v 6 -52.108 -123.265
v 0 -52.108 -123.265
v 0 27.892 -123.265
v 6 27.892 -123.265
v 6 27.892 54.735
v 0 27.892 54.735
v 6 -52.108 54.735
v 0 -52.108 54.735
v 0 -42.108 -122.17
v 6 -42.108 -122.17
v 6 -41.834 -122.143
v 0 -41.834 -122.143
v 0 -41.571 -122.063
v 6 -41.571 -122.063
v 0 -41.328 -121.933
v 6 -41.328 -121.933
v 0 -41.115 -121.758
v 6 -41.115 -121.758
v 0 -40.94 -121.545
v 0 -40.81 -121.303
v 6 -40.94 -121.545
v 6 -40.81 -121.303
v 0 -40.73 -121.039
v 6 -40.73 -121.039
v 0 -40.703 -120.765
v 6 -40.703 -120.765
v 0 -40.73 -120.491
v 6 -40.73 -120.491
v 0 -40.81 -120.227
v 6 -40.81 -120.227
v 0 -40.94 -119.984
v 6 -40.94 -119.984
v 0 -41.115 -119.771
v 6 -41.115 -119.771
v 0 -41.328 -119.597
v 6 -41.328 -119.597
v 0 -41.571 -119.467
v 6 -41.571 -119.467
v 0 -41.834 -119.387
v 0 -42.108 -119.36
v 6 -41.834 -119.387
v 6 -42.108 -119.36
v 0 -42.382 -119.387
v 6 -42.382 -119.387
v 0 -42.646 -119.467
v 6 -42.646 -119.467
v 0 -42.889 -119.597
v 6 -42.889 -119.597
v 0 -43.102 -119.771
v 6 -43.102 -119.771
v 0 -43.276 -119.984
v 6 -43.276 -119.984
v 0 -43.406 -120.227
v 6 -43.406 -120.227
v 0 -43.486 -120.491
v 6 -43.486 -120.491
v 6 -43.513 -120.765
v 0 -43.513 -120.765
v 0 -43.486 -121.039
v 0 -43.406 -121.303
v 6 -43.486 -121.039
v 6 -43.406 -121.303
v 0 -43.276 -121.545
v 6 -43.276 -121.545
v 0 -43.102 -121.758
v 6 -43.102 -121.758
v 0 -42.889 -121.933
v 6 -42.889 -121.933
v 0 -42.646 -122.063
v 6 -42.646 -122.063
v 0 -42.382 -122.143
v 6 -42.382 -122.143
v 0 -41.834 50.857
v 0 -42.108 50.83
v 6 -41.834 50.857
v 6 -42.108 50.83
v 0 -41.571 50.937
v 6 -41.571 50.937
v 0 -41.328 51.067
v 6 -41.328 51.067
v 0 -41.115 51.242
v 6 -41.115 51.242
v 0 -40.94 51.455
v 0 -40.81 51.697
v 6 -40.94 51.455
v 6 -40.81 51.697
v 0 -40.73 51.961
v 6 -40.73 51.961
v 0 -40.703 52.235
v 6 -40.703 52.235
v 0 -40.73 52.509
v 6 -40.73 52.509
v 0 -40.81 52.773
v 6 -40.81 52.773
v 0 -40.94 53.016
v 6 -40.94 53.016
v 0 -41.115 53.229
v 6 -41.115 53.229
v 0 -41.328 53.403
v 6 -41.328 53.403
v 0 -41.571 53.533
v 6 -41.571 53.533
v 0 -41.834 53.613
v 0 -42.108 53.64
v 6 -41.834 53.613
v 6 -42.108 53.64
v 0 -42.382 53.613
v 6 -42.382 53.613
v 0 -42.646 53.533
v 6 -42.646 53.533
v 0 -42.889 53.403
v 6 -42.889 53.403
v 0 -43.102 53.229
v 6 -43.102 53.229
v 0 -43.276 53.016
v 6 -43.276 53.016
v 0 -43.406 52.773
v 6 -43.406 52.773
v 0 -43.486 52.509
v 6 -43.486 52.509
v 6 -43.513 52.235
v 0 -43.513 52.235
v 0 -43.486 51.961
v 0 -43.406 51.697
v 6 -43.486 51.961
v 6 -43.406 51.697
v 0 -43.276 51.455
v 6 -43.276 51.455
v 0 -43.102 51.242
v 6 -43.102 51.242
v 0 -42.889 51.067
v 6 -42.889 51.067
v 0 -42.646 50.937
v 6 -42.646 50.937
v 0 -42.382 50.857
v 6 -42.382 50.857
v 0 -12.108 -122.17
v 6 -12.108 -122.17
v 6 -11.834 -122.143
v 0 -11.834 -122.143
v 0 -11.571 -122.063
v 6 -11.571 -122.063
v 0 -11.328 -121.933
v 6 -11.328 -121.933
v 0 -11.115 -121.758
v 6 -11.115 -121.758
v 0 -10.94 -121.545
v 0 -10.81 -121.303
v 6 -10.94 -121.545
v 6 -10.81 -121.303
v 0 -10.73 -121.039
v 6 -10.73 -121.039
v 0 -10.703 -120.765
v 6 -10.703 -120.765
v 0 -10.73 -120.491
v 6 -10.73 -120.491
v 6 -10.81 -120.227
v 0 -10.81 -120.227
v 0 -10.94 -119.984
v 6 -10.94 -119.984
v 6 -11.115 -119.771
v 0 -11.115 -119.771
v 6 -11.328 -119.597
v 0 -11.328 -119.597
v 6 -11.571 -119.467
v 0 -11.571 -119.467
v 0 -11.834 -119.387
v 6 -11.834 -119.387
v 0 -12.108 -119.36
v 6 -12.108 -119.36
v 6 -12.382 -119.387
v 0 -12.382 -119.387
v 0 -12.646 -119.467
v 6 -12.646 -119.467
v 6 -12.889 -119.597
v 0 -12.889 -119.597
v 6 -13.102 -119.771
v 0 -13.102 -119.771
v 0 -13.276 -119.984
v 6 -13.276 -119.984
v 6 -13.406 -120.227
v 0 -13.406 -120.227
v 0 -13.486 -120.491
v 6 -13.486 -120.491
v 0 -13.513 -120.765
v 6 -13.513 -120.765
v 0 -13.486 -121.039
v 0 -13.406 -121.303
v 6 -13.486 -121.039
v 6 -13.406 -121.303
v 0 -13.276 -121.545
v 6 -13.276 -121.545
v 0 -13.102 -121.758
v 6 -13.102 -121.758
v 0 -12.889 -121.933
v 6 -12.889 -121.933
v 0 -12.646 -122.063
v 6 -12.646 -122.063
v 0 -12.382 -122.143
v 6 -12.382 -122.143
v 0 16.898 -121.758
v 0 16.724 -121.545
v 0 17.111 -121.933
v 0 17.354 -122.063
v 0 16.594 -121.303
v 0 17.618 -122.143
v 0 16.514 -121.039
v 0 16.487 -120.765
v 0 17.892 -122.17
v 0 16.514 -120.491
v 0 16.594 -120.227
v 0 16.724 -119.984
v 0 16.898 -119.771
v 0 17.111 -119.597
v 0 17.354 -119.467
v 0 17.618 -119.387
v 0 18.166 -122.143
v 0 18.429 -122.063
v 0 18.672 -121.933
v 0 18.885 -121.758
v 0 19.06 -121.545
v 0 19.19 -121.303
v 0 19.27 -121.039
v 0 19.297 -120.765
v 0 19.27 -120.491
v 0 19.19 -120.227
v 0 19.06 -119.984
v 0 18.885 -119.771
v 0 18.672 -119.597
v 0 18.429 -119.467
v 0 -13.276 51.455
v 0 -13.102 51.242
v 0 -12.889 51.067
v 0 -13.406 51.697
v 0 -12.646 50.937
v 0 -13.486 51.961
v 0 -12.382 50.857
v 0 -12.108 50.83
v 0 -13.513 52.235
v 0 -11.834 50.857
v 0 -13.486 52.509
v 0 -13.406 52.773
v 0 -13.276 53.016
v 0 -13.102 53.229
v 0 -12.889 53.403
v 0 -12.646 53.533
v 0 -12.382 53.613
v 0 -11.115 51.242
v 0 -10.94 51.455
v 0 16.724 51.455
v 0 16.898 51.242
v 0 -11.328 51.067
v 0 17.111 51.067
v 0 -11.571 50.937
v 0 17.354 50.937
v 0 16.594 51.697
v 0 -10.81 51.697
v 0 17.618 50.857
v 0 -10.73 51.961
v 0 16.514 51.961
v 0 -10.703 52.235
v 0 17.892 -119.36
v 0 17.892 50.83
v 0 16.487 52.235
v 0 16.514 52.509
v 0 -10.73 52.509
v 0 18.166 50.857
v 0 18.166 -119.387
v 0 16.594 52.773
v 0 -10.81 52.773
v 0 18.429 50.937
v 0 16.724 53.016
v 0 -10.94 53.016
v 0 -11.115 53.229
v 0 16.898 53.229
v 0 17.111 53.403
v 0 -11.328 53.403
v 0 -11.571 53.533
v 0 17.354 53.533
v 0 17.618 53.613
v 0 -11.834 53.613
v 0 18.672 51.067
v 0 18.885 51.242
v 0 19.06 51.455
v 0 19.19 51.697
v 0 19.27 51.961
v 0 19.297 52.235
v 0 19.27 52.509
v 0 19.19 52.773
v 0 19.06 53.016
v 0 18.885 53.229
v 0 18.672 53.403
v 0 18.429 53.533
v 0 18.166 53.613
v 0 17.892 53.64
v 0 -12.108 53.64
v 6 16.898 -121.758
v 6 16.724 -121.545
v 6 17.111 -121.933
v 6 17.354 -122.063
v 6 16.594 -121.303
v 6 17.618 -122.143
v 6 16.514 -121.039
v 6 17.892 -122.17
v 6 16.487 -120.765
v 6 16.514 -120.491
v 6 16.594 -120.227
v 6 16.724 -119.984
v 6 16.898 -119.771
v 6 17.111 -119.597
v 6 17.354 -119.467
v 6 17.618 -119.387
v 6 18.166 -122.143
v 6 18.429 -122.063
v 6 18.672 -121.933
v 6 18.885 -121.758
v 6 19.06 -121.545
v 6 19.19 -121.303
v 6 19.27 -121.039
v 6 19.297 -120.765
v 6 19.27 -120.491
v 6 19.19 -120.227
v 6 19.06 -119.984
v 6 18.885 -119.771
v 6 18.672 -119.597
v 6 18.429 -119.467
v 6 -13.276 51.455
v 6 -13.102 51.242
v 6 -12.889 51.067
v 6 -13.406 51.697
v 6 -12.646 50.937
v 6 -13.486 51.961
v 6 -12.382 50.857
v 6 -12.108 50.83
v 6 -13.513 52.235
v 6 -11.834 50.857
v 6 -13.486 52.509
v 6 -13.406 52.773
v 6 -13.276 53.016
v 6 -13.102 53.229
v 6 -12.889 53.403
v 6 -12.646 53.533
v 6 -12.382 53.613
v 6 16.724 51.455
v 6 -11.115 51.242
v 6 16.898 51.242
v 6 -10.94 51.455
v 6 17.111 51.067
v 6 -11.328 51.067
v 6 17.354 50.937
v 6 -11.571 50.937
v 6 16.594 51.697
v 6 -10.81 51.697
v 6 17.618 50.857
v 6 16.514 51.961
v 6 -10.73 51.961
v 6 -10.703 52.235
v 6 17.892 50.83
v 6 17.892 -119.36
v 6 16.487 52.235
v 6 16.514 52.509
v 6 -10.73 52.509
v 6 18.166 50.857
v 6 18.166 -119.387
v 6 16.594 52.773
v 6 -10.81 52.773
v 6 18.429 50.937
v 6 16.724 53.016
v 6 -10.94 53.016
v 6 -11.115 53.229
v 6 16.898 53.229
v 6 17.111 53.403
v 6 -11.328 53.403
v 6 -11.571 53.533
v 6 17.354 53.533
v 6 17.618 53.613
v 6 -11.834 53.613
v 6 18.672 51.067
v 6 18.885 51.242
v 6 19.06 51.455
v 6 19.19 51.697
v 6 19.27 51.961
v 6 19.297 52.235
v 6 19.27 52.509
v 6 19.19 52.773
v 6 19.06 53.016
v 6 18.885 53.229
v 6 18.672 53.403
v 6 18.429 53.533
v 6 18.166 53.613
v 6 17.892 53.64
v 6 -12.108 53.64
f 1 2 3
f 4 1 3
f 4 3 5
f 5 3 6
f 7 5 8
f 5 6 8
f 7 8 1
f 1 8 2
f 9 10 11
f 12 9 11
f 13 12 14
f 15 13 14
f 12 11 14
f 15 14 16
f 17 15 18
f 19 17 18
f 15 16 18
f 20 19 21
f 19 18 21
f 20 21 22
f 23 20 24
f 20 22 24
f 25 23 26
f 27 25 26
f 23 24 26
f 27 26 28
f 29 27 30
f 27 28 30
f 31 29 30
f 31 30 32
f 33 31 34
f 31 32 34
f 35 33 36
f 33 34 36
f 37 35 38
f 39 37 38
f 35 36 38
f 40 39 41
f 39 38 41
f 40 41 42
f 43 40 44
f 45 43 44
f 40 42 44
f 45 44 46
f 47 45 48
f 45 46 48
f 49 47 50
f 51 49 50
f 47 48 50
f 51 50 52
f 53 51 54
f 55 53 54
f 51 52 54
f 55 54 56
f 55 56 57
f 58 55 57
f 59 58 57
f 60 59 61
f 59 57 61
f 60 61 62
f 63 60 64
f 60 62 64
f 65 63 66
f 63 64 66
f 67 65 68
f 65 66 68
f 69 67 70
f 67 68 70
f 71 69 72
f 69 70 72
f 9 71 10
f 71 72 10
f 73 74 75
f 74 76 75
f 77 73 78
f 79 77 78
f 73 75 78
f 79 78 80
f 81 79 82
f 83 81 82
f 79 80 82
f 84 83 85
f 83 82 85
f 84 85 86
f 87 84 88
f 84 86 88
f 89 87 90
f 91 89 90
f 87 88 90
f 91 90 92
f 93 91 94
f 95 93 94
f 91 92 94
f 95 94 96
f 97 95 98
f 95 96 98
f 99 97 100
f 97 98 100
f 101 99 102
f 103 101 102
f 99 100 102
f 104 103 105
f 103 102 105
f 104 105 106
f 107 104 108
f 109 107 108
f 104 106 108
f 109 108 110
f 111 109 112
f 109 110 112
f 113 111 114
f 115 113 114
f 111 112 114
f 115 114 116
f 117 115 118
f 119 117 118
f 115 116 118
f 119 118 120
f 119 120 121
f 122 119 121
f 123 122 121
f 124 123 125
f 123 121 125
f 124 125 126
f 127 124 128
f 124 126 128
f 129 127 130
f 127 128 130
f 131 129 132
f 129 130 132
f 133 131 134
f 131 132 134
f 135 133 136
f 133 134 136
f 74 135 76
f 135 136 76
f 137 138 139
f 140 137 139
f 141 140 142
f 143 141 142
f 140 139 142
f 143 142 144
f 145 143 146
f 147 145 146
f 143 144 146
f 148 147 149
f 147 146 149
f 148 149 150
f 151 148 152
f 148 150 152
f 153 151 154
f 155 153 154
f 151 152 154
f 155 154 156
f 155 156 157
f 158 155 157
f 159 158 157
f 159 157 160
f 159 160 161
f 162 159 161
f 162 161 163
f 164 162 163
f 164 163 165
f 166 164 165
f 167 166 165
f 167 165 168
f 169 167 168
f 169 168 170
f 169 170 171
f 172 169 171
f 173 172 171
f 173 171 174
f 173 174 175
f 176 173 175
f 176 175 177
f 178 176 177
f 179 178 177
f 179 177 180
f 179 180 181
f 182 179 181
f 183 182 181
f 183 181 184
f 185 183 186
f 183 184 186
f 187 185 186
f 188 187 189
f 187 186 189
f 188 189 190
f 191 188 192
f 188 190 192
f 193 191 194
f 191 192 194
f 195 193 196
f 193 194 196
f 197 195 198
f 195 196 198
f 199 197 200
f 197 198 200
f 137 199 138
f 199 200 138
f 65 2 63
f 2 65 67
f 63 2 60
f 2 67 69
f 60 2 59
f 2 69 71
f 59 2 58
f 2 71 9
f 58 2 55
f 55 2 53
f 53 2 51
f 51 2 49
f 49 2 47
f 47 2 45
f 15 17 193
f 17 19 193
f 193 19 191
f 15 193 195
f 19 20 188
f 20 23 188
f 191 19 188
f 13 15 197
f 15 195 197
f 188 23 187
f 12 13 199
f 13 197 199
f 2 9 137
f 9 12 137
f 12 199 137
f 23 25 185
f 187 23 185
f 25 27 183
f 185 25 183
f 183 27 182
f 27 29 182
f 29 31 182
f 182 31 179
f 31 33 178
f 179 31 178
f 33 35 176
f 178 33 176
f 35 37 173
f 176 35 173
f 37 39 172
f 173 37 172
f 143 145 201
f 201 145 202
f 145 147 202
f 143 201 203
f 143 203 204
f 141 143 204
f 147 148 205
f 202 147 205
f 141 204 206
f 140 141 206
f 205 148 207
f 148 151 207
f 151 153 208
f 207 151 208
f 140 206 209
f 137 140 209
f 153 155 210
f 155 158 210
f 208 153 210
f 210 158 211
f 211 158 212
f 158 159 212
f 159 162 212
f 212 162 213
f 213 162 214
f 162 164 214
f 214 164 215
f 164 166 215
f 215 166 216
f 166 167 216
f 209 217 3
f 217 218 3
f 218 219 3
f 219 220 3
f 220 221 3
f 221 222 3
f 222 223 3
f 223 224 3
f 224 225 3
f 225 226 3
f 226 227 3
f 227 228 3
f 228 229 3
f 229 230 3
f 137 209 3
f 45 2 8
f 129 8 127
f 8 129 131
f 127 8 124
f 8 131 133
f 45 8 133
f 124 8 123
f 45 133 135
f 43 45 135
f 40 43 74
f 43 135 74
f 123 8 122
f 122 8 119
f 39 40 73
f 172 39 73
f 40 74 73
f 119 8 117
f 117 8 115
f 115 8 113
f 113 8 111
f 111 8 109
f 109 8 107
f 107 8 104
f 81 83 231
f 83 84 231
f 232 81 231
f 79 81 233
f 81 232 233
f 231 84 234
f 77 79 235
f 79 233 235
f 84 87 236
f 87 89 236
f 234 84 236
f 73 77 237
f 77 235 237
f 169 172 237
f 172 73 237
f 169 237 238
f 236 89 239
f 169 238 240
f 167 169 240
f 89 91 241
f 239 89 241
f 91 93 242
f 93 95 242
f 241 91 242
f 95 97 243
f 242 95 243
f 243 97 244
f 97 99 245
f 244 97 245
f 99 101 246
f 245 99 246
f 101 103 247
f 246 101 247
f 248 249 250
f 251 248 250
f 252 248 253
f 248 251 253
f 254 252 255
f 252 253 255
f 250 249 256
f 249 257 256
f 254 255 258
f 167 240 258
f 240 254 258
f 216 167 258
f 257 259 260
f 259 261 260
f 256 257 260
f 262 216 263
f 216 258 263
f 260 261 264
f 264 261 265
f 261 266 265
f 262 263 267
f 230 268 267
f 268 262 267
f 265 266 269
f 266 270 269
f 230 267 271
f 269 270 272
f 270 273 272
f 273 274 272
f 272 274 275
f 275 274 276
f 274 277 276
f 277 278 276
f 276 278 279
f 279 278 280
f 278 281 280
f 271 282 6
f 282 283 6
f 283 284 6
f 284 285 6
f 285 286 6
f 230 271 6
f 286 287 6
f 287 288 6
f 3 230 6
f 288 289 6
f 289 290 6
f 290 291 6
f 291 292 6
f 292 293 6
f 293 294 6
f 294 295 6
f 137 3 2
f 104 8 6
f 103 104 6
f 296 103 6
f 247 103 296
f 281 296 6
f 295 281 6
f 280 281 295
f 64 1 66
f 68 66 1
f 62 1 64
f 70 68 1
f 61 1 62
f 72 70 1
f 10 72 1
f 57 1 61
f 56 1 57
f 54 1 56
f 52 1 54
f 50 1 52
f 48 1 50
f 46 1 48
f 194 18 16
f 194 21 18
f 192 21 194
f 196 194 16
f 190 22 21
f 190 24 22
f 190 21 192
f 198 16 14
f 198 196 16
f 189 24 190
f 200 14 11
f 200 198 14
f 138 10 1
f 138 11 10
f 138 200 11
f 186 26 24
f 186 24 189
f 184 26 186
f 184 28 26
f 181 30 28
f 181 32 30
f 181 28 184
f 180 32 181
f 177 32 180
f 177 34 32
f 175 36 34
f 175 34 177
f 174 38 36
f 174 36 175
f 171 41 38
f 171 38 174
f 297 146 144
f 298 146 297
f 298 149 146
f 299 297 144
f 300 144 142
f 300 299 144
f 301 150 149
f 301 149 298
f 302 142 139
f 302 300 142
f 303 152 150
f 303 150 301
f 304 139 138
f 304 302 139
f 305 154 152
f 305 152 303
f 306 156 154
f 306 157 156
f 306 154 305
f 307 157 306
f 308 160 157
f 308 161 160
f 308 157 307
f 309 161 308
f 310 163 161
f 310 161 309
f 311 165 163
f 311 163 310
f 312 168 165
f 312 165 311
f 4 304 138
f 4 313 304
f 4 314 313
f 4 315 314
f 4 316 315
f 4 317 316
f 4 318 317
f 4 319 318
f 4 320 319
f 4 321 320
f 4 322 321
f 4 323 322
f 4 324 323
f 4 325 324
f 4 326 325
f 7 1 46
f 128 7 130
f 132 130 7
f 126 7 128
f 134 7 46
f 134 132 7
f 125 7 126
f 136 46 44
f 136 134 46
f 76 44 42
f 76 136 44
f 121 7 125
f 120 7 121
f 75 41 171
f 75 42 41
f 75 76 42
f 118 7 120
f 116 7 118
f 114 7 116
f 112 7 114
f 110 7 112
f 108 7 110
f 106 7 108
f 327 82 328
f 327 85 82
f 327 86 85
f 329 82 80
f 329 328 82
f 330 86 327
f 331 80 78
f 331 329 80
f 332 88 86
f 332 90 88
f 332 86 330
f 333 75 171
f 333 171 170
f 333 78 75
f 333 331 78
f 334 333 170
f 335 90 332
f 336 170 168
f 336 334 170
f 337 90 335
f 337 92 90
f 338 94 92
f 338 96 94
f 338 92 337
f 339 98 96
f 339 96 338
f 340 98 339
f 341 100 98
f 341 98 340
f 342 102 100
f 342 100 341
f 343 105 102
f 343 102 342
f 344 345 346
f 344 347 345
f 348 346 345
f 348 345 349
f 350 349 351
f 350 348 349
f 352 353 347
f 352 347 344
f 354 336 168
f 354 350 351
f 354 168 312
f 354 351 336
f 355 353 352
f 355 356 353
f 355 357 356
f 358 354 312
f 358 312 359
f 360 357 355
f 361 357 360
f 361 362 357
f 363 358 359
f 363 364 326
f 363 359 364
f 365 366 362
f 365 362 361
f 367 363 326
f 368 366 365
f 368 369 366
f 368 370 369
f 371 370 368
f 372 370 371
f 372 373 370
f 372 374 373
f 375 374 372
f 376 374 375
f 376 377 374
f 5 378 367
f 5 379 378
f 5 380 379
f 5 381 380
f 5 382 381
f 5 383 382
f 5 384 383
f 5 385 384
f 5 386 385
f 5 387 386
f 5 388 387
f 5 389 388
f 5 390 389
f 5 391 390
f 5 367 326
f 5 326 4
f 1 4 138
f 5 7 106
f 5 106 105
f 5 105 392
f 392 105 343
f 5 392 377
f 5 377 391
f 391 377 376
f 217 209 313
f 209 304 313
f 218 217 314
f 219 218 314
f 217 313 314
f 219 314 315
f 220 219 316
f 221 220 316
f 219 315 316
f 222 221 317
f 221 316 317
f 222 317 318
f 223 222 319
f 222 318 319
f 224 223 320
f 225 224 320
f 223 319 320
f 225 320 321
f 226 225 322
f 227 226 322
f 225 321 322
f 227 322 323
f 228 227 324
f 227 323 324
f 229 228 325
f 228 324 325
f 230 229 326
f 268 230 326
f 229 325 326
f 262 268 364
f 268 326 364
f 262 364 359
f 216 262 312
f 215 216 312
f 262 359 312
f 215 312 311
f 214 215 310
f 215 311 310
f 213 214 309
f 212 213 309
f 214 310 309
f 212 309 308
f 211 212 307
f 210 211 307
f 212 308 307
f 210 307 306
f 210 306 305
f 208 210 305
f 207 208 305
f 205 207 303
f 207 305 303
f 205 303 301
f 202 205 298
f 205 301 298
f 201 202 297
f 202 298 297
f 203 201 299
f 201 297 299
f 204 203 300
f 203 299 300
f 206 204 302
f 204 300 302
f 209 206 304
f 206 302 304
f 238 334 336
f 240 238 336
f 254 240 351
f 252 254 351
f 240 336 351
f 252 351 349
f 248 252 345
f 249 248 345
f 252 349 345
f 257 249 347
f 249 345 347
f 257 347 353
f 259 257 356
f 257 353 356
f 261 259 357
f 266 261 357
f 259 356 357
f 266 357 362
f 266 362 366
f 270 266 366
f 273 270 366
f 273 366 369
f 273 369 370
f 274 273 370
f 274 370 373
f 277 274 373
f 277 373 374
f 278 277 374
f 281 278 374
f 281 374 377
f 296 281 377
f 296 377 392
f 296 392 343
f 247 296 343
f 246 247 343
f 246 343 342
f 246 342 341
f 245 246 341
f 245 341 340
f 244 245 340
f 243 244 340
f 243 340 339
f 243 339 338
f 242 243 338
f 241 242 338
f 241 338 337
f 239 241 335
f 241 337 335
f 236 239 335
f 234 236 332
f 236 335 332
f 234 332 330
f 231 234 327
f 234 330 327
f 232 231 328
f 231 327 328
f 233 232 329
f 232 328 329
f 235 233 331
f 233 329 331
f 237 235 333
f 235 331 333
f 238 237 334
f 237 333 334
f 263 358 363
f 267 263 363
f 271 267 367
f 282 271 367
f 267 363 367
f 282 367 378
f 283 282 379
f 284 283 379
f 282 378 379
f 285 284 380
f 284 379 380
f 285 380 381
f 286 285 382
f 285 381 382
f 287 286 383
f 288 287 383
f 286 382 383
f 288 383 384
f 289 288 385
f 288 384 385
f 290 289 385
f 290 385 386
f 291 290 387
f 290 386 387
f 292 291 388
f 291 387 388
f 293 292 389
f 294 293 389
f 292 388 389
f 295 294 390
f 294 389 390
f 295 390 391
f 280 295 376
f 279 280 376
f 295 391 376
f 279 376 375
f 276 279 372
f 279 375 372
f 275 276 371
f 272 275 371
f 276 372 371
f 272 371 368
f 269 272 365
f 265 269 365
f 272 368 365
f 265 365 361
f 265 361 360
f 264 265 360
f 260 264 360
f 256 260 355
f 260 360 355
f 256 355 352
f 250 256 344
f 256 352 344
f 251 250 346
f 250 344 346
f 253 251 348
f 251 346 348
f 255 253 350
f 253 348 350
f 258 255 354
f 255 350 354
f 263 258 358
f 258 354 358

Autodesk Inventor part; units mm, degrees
ref_plane "YZ Plane" through (0, 0, 0) normal (1, 0, 0) x (0, 1, 0)
ref_plane "XZ Plane" through (0, 0, 0) normal (0, 1, 0) x (-1, 0, 0)
ref_plane "XY Plane" through (0, 0, 0) normal (0, 0, 1) x (1, 0, 0)
sketch "Sketch1" plane through (0, 0, 0) normal (1, 0, 0) x (0, 1, 0)
  line L0 (-52.1082, -123.2649) -> (27.8918, -123.2649)
  line L1 (27.8918, -123.2649) -> (27.8918, 54.7351)
  line L2 (27.8918, 54.7351) -> (-52.1082, 54.7351)
  line L3 (-52.1082, 54.7351) -> (-52.1082, -123.2649)
  point P0 (0, 0)
  dimension "d0" = 178
  dimension "d1" = 80
extrude "Extrusion1" add sketch "Sketch1" along normal blind 6
sketch "Sketch2" plane through (6, 0, 0) normal (1, 0, 0) x (0, 0, -1)
  circle A0 centre (-52.2351, 17.8918) radius 1.405
  line L0 (-54.7351, 27.8918) -> (-54.7351, -52.1082) projected
  line L1 (123.2649, 27.8918) -> (-54.7351, 27.8918) projected
  point P0 (0, 0)
  dimension "d4" = 2.81
  dimension "d5" = 2.5
  dimension "d6" = 10
extrude "Extrusion2" cut sketch "Sketch2" against normal blind 10
pattern_linear "Rectangular Pattern1" count 3 spacing 30 along (0, -1, 0) count 2 spacing -173 along (0, 0, 1) of "Extrusion2"
equation "\"d0\" = -2 * CornerOffset + BoxWidth - 2 * SheetThickness"
equation "\"d1\" = BoxHeight"
equation "\"d2\" = SheetThickness"
equation "\"d4\" = M3Hole"
equation "\"d5\" = HoleOffset"
equation "\"BoxHeight\" = 80"
equation "\"SheetThickness\" = 6"
equation "\"CornerOffset\" = 5"
equation "\"M3Hole\" = 2.81"
equation "\"HoleOffset\" = 2.5"
equation "\"BoxWidth\" = 200"
properties part number "cab_L_L"
